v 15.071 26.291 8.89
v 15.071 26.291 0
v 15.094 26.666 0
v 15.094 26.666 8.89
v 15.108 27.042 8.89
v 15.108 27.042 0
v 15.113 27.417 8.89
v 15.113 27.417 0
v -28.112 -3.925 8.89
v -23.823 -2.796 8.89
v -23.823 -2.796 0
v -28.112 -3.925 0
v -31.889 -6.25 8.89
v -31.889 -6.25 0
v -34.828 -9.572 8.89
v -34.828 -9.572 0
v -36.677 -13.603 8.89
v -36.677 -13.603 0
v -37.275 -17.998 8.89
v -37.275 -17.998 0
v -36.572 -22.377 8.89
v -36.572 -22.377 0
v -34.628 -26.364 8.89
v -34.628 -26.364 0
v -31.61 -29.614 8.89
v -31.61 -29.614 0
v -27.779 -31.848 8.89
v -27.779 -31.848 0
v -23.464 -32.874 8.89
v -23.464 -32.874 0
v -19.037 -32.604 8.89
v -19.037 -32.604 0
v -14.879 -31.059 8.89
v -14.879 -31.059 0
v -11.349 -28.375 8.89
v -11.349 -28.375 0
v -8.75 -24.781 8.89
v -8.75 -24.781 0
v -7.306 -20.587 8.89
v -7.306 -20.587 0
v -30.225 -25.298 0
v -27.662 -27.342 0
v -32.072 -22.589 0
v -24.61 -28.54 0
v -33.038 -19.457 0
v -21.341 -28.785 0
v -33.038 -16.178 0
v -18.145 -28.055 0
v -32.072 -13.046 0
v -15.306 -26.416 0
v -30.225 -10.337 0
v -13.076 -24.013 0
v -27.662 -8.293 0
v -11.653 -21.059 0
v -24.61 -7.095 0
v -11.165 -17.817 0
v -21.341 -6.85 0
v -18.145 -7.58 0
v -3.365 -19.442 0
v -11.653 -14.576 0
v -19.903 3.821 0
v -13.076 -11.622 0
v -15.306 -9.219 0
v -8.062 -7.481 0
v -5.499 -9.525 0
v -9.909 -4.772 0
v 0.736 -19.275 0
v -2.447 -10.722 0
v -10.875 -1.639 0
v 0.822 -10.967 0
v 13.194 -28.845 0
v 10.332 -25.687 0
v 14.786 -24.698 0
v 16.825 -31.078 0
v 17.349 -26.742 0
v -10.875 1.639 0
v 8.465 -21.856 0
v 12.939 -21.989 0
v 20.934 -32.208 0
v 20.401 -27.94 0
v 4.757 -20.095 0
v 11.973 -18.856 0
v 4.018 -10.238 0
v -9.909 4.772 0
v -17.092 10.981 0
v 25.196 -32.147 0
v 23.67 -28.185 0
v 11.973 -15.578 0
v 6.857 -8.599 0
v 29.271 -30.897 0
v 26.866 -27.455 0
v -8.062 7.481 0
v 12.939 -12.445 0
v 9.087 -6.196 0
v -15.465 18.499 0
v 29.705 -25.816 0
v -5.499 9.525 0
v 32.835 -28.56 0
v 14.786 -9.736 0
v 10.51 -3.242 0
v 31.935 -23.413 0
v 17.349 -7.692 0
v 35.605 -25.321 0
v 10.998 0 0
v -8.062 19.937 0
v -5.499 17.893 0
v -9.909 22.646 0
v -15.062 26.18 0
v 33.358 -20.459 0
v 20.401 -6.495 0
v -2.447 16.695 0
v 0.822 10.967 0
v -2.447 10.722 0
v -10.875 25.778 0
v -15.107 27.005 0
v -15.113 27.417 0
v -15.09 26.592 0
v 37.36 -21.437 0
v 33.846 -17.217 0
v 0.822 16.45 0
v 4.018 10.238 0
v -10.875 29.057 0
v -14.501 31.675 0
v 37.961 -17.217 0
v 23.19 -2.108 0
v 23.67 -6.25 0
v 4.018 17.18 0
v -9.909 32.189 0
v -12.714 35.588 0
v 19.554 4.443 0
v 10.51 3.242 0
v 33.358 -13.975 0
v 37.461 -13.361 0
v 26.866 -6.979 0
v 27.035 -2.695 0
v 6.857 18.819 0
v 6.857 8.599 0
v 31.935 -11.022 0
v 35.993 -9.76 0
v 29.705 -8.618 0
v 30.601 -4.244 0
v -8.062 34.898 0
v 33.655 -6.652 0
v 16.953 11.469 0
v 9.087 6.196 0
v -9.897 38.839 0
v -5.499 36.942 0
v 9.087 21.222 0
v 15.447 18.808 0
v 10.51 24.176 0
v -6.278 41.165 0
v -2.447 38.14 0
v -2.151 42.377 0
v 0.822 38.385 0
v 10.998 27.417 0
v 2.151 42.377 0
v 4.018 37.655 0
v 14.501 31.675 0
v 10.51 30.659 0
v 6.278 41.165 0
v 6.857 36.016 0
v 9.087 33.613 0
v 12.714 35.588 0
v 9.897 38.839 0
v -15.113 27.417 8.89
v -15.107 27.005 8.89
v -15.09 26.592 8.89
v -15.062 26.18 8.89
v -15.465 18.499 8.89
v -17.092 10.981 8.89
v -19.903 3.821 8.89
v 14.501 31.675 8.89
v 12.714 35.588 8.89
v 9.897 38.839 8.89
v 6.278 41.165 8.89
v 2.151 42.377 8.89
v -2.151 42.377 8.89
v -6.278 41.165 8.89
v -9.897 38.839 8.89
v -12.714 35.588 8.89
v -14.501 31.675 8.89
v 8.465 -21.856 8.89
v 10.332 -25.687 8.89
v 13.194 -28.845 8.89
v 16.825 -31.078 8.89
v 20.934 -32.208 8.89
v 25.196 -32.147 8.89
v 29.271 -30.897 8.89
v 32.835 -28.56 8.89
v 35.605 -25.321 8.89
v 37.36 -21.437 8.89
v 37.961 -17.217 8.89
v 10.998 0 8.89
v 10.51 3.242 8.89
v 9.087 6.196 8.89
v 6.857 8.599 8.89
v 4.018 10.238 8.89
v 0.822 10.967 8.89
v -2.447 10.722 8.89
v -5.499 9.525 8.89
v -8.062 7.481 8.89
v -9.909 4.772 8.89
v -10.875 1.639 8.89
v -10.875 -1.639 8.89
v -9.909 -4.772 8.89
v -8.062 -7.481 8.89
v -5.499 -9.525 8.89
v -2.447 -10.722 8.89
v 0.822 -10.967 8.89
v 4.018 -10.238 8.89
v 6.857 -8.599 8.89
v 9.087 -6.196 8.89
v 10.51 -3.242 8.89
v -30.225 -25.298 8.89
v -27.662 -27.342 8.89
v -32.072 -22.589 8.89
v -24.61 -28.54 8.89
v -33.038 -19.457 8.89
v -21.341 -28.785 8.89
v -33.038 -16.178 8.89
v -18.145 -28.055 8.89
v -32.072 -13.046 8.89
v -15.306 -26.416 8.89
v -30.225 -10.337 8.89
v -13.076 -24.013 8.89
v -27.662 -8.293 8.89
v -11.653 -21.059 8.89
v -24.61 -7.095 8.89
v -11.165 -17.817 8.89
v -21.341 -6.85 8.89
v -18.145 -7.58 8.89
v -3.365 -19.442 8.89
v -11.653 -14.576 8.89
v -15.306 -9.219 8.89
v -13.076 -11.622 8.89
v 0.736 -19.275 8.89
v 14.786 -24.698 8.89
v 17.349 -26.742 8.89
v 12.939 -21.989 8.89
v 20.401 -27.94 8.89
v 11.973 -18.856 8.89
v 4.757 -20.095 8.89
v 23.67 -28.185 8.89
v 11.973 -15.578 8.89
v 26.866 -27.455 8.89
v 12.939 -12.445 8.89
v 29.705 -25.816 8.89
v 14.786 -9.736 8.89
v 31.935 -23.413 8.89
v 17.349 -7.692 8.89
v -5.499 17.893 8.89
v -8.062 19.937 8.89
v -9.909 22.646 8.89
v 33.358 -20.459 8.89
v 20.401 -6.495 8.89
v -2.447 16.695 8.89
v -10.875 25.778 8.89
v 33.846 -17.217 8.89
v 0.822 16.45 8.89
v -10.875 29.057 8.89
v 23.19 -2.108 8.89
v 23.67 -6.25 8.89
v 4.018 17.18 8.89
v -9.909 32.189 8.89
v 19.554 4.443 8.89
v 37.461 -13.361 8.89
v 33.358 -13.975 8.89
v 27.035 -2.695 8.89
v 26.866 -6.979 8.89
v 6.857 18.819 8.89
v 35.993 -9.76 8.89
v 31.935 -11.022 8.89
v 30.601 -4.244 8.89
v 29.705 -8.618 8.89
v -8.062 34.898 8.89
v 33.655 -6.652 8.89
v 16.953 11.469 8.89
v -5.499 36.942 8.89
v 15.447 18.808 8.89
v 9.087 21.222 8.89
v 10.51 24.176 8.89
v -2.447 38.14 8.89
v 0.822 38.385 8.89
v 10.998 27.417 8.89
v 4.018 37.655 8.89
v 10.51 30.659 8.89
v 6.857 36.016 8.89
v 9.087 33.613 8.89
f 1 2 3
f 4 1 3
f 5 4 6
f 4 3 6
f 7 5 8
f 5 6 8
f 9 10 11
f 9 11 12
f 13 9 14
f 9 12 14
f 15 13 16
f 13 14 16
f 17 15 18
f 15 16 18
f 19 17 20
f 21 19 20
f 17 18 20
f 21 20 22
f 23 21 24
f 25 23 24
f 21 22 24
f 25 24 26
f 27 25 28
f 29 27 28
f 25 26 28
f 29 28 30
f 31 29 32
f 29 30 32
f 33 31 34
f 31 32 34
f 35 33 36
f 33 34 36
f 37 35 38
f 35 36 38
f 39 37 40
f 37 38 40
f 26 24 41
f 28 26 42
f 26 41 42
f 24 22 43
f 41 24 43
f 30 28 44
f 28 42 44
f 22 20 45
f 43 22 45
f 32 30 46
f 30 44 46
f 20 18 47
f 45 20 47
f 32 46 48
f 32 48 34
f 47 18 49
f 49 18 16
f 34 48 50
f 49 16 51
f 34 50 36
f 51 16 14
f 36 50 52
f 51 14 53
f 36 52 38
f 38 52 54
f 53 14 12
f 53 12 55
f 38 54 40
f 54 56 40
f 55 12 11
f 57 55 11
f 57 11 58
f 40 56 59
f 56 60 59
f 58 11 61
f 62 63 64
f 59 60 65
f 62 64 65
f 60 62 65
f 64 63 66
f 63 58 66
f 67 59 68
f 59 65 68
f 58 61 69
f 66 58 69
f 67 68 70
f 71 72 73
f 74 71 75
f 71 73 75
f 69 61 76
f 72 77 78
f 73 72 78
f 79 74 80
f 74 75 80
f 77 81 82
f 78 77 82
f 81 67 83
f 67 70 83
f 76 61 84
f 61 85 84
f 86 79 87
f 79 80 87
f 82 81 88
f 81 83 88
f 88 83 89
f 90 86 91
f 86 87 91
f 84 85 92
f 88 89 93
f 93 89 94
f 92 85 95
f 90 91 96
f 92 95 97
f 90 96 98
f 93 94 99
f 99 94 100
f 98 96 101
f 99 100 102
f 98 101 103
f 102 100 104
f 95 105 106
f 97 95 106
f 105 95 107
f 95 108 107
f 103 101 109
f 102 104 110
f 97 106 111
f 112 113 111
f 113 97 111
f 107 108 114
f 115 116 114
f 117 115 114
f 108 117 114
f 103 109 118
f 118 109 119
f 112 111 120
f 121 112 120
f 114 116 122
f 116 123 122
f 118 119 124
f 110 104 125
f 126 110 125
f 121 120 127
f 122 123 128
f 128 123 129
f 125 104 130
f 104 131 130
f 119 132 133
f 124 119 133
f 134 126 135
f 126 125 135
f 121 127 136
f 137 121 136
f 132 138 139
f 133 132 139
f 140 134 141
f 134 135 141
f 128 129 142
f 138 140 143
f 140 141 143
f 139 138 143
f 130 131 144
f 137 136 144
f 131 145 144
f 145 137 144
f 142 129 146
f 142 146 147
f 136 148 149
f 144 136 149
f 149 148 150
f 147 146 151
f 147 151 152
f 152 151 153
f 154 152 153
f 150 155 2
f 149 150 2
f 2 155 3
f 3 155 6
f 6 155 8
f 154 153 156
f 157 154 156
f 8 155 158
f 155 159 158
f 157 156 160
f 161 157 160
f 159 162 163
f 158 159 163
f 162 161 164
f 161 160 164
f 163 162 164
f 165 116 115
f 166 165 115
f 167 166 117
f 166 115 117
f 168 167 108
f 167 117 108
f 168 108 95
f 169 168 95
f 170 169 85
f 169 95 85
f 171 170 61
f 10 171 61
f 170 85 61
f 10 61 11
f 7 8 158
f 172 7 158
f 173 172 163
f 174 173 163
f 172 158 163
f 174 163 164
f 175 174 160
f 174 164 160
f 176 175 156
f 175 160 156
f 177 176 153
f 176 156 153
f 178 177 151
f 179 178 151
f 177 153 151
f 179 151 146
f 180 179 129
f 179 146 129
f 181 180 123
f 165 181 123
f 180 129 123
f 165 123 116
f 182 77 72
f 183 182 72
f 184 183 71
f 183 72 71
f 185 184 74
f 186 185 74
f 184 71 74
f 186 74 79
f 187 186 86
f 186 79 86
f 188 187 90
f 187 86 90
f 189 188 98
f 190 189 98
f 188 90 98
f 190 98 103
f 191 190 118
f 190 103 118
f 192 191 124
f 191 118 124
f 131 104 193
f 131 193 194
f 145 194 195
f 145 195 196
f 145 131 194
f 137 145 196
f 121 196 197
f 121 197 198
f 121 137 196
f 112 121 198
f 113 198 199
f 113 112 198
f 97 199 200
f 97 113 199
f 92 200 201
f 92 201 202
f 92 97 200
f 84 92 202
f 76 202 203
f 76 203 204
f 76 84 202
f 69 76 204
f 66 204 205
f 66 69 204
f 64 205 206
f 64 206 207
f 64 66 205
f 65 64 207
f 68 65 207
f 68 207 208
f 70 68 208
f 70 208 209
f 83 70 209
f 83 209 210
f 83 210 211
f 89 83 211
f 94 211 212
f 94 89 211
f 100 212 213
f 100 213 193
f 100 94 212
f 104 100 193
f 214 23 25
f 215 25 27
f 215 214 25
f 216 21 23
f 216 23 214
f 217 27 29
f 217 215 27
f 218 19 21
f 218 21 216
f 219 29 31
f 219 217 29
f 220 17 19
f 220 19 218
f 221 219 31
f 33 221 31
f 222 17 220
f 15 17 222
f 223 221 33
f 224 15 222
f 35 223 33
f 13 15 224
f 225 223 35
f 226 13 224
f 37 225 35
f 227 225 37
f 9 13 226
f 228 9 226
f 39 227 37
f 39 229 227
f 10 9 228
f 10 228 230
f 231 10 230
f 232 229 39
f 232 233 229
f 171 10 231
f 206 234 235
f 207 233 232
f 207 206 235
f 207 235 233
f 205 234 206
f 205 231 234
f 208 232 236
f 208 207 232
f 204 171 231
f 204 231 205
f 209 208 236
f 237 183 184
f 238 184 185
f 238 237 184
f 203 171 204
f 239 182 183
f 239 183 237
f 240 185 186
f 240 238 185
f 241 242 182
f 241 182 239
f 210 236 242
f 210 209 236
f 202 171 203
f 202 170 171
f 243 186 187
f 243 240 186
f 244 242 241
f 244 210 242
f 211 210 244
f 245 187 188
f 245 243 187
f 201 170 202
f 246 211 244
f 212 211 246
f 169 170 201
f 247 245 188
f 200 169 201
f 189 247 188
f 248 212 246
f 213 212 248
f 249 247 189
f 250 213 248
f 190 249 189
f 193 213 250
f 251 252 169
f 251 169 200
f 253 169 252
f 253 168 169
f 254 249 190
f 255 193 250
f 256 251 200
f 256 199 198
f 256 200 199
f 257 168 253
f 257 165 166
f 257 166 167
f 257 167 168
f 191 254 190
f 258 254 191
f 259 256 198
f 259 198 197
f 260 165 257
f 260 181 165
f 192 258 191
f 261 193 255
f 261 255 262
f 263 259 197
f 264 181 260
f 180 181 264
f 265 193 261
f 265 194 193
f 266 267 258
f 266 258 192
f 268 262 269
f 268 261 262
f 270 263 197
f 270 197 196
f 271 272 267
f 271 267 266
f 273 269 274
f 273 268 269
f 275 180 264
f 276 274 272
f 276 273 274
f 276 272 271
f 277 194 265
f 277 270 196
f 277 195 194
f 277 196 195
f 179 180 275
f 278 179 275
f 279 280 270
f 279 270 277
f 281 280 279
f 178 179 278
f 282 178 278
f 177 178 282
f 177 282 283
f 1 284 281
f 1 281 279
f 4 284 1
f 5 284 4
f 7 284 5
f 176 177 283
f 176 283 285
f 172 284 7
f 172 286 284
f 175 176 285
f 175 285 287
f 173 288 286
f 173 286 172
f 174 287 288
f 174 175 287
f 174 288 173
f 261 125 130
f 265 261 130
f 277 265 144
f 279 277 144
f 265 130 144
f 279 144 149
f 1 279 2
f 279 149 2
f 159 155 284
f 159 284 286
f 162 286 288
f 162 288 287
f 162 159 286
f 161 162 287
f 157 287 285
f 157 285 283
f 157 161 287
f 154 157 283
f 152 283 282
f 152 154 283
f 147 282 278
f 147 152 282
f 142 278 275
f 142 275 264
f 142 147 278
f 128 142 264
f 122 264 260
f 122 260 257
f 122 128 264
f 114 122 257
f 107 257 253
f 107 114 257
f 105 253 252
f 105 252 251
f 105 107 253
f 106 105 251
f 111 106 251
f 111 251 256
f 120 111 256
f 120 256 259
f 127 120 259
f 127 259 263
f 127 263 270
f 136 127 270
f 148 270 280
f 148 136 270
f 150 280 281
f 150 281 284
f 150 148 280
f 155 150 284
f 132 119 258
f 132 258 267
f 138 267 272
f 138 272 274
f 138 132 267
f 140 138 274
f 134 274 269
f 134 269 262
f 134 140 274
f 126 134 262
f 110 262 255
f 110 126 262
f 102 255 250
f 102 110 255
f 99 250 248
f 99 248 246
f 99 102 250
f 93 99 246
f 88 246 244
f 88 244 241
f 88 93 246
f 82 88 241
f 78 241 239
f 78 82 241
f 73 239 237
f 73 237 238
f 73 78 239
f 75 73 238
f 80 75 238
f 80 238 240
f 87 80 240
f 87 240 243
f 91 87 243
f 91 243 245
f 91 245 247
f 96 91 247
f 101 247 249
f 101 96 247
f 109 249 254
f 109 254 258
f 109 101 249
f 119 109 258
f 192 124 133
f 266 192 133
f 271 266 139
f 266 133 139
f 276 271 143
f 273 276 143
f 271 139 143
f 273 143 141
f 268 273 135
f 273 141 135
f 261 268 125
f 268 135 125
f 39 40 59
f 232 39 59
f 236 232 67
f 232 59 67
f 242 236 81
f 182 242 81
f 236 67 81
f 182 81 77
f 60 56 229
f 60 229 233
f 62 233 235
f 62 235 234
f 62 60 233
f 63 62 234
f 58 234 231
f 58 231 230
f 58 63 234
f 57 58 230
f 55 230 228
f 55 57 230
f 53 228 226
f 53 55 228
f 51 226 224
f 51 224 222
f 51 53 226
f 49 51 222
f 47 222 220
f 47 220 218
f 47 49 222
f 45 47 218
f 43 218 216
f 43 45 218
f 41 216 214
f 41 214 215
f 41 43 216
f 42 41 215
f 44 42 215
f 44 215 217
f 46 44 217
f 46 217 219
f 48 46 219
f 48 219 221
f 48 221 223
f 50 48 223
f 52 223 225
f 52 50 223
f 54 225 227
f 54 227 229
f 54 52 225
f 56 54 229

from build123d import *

# Parameters (mm, degrees)
F0_R     = 10.9982
F1_DEPTH = 8.89


with BuildPart() as f1:
    # F0 (on Top) → F1 (new body)
    with BuildSketch(Plane.XY):
        with BuildLine():
            ThreePointArc((-7.30594, -20.586929), (-7.114139, -19.208105), (-7.050024, -17.817482))
            ThreePointArc((-7.050024, -17.817482), (-12.08059, -6.559271), (-23.823306, -2.795956))
            ThreePointArc((-23.823306, -2.795956), (-33.238608, -28.100195), (-7.30594, -20.586929))
        make_face()
        with Locations((-22.163024, -17.817482)):
            Circle(F0_R, mode=Mode.SUBTRACT)
        with BuildLine():
            ThreePointArc((-23.823306, -2.795956), (-12.08059, -6.559271), (-7.050024, -17.817482))
            ThreePointArc((-7.050024, -17.817482), (-7.114139, -19.208105), (-7.30594, -20.586929))
            ThreePointArc((-7.30594, -20.586929), (0.735892, -19.274873), (8.464534, -21.855699))
            ThreePointArc((8.464534, -21.855699), (10.732709, -8.182627), (23.190467, -2.107943))
            ThreePointArc((23.190467, -2.107943), (16.953024, 11.468692), (15.070929, 26.290583))
            ThreePointArc((15.070929, 26.290583), (0.05546, 12.304565), (-15.062253, 26.180002))
            ThreePointArc((-15.062253, 26.180002), (-17.092318, 10.981347), (-23.823306, -2.795956))
        make_face()
        Circle(F0_R, mode=Mode.SUBTRACT)
        with BuildLine():
            ThreePointArc((-15.113, 27.417463), (-15.083625, 26.798897), (-15.062253, 26.180002))
            ThreePointArc((-15.062253, 26.180002), (0.05546, 12.304565), (15.070929, 26.290583))
            ThreePointArc((15.070929, 26.290583), (15.088741, 26.854143), (15.113, 27.417463))
            ThreePointArc((15.113, 27.417463), (0, 42.530463), (-15.113, 27.417463))
        make_face()
        with Locations((0, 27.417463)):
            Circle(F0_R, mode=Mode.SUBTRACT)
        with BuildLine():
            ThreePointArc((-15.113, 27.417463), (-15.100308, 26.798212), (-15.062253, 26.180002))
            ThreePointArc((-15.062253, 26.180002), (-15.083625, 26.798897), (-15.113, 27.417463))
        make_face()
        with BuildLine():
            ThreePointArc((23.190467, -2.107943), (10.732709, -8.182627), (8.464534, -21.855699))
            ThreePointArc((8.464534, -21.855699), (25.195882, -32.146581), (37.96106, -17.217064))
            ThreePointArc((37.96106, -17.217064), (33.654946, -6.652312), (23.190467, -2.107943))
        make_face()
        with Locations((22.84806, -17.217064)):
            Circle(F0_R, mode=Mode.SUBTRACT)
        with BuildLine():
            ThreePointArc((15.113, 27.417463), (15.088741, 26.854143), (15.070929, 26.290583))
            ThreePointArc((15.070929, 26.290583), (15.102479, 26.85363), (15.113, 27.417463))
        make_face()
    extrude(amount=F1_DEPTH)


solid = f1.part
